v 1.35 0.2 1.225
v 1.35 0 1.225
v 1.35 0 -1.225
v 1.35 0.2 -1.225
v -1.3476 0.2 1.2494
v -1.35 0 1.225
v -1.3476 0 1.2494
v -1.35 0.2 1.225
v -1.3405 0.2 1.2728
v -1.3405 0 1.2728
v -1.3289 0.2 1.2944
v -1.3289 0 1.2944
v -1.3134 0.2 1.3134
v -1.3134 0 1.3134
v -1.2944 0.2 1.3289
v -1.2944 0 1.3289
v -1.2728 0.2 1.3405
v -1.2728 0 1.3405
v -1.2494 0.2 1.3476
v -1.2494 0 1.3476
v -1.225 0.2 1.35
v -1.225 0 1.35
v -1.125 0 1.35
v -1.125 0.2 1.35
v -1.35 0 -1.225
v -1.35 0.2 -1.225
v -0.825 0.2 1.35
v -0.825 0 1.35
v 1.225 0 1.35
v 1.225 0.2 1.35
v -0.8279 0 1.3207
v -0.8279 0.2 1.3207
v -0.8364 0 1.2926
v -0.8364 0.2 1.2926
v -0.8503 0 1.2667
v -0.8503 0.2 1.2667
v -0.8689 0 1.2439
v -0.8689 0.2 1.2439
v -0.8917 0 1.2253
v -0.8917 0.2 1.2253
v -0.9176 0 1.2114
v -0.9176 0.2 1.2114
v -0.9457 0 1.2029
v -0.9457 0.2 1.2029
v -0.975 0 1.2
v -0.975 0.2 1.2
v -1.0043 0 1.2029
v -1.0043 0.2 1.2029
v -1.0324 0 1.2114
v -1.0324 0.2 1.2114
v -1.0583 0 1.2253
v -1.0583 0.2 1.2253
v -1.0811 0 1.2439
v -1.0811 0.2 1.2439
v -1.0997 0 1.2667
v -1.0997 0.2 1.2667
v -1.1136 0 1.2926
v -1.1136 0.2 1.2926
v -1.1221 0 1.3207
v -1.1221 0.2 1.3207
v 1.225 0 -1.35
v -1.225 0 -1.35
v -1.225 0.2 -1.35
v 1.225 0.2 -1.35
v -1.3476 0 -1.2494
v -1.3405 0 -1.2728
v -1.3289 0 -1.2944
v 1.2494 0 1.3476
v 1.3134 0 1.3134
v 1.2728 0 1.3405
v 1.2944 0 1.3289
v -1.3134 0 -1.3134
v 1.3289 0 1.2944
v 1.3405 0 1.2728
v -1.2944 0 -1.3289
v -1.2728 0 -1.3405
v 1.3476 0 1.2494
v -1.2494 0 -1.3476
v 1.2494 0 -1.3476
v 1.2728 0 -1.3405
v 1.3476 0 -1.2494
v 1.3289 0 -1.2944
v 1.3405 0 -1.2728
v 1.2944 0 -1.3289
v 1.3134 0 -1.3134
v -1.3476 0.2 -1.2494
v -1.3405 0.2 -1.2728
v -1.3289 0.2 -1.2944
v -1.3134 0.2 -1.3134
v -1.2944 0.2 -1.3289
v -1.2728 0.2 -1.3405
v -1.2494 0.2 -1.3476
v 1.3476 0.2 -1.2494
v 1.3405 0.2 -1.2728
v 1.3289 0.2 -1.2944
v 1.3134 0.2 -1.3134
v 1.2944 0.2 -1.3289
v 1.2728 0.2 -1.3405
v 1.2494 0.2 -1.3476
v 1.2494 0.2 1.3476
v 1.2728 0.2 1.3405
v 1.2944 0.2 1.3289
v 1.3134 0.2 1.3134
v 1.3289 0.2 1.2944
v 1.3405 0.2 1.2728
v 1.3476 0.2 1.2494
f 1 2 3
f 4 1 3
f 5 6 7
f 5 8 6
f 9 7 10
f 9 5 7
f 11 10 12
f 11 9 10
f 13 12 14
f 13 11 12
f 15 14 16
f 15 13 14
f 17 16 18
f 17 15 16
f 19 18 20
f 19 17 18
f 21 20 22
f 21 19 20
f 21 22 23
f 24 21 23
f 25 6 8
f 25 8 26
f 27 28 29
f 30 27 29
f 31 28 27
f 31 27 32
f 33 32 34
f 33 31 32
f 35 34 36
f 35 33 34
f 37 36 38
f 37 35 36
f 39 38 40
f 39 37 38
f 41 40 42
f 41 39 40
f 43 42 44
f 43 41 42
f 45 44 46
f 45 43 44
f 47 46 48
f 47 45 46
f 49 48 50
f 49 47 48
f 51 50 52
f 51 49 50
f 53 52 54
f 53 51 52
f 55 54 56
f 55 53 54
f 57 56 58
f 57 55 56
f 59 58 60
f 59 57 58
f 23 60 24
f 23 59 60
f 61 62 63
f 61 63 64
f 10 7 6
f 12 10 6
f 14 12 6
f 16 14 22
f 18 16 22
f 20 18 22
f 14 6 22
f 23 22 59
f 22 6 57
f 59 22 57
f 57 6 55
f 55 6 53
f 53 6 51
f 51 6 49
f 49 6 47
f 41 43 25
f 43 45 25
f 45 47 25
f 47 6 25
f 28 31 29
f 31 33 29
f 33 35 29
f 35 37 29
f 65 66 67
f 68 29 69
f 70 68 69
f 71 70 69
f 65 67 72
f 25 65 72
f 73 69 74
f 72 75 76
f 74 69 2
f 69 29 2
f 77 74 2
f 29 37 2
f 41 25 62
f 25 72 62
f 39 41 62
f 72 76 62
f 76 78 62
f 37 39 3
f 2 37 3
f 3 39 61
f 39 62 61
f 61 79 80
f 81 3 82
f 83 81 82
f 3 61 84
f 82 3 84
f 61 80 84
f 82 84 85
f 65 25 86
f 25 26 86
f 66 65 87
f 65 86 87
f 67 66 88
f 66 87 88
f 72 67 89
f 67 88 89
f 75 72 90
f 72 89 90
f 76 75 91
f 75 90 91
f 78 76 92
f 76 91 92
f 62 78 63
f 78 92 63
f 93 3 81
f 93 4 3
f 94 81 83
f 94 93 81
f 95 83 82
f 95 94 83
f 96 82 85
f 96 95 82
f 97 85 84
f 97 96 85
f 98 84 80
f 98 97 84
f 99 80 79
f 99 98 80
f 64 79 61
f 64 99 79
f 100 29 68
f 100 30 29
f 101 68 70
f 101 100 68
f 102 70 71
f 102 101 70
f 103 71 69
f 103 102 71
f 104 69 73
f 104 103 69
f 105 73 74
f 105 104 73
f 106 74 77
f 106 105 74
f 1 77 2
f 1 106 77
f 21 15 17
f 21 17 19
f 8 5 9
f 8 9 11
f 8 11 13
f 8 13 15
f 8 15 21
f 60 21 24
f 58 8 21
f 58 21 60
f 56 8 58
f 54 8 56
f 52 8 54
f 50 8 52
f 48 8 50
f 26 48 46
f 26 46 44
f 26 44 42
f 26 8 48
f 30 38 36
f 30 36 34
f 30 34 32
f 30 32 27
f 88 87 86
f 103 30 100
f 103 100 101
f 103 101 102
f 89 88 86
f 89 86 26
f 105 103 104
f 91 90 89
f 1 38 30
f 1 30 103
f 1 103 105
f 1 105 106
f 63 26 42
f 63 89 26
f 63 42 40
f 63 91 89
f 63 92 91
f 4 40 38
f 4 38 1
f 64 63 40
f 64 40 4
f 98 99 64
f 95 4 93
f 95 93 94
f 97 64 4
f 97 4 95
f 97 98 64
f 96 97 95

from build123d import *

# Parameters (mm, degrees)
SKETCH1_W           = 2.7
SKETCH1_H           = 2.7
BOSS_EXTRUDE1_DEPTH = 0.2
FILLET1_R           = 0.125
CUT_EXTRUDE2_DEPTH  = 1.2


with BuildPart() as part:
    # Sketch1 → Boss-Extrude1 (new body)
    with BuildSketch(Plane(origin=(0, 0, 0), x_dir=(1, 0, 0), z_dir=(0, 1, 0))):
        Rectangle(SKETCH1_W, SKETCH1_H)
    extrude(amount=BOSS_EXTRUDE1_DEPTH)

    # Fillet1
    fillet1_edges = [part.edges().sort_by_distance(p)[0] for p in [
        (1.35, 0.1, 1.35),
        (-1.35, 0.1, 1.35),
        (-1.35, 0.1, -1.35),
        (1.35, 0.1, -1.35),
    ]]
    fillet(fillet1_edges, radius=FILLET1_R)

    # Sketch3 → Cut-Extrude2 (cut, through all)
    with BuildSketch(Plane.XZ):
        with BuildLine():
            Line((-1.125, 1.35), (-0.825, 1.35))
            ThreePointArc((-0.825, 1.35), (-0.975, 1.2), (-1.125, 1.35))
        make_face()
    extrude(amount=-CUT_EXTRUDE2_DEPTH, mode=Mode.SUBTRACT)


solid = part.part
